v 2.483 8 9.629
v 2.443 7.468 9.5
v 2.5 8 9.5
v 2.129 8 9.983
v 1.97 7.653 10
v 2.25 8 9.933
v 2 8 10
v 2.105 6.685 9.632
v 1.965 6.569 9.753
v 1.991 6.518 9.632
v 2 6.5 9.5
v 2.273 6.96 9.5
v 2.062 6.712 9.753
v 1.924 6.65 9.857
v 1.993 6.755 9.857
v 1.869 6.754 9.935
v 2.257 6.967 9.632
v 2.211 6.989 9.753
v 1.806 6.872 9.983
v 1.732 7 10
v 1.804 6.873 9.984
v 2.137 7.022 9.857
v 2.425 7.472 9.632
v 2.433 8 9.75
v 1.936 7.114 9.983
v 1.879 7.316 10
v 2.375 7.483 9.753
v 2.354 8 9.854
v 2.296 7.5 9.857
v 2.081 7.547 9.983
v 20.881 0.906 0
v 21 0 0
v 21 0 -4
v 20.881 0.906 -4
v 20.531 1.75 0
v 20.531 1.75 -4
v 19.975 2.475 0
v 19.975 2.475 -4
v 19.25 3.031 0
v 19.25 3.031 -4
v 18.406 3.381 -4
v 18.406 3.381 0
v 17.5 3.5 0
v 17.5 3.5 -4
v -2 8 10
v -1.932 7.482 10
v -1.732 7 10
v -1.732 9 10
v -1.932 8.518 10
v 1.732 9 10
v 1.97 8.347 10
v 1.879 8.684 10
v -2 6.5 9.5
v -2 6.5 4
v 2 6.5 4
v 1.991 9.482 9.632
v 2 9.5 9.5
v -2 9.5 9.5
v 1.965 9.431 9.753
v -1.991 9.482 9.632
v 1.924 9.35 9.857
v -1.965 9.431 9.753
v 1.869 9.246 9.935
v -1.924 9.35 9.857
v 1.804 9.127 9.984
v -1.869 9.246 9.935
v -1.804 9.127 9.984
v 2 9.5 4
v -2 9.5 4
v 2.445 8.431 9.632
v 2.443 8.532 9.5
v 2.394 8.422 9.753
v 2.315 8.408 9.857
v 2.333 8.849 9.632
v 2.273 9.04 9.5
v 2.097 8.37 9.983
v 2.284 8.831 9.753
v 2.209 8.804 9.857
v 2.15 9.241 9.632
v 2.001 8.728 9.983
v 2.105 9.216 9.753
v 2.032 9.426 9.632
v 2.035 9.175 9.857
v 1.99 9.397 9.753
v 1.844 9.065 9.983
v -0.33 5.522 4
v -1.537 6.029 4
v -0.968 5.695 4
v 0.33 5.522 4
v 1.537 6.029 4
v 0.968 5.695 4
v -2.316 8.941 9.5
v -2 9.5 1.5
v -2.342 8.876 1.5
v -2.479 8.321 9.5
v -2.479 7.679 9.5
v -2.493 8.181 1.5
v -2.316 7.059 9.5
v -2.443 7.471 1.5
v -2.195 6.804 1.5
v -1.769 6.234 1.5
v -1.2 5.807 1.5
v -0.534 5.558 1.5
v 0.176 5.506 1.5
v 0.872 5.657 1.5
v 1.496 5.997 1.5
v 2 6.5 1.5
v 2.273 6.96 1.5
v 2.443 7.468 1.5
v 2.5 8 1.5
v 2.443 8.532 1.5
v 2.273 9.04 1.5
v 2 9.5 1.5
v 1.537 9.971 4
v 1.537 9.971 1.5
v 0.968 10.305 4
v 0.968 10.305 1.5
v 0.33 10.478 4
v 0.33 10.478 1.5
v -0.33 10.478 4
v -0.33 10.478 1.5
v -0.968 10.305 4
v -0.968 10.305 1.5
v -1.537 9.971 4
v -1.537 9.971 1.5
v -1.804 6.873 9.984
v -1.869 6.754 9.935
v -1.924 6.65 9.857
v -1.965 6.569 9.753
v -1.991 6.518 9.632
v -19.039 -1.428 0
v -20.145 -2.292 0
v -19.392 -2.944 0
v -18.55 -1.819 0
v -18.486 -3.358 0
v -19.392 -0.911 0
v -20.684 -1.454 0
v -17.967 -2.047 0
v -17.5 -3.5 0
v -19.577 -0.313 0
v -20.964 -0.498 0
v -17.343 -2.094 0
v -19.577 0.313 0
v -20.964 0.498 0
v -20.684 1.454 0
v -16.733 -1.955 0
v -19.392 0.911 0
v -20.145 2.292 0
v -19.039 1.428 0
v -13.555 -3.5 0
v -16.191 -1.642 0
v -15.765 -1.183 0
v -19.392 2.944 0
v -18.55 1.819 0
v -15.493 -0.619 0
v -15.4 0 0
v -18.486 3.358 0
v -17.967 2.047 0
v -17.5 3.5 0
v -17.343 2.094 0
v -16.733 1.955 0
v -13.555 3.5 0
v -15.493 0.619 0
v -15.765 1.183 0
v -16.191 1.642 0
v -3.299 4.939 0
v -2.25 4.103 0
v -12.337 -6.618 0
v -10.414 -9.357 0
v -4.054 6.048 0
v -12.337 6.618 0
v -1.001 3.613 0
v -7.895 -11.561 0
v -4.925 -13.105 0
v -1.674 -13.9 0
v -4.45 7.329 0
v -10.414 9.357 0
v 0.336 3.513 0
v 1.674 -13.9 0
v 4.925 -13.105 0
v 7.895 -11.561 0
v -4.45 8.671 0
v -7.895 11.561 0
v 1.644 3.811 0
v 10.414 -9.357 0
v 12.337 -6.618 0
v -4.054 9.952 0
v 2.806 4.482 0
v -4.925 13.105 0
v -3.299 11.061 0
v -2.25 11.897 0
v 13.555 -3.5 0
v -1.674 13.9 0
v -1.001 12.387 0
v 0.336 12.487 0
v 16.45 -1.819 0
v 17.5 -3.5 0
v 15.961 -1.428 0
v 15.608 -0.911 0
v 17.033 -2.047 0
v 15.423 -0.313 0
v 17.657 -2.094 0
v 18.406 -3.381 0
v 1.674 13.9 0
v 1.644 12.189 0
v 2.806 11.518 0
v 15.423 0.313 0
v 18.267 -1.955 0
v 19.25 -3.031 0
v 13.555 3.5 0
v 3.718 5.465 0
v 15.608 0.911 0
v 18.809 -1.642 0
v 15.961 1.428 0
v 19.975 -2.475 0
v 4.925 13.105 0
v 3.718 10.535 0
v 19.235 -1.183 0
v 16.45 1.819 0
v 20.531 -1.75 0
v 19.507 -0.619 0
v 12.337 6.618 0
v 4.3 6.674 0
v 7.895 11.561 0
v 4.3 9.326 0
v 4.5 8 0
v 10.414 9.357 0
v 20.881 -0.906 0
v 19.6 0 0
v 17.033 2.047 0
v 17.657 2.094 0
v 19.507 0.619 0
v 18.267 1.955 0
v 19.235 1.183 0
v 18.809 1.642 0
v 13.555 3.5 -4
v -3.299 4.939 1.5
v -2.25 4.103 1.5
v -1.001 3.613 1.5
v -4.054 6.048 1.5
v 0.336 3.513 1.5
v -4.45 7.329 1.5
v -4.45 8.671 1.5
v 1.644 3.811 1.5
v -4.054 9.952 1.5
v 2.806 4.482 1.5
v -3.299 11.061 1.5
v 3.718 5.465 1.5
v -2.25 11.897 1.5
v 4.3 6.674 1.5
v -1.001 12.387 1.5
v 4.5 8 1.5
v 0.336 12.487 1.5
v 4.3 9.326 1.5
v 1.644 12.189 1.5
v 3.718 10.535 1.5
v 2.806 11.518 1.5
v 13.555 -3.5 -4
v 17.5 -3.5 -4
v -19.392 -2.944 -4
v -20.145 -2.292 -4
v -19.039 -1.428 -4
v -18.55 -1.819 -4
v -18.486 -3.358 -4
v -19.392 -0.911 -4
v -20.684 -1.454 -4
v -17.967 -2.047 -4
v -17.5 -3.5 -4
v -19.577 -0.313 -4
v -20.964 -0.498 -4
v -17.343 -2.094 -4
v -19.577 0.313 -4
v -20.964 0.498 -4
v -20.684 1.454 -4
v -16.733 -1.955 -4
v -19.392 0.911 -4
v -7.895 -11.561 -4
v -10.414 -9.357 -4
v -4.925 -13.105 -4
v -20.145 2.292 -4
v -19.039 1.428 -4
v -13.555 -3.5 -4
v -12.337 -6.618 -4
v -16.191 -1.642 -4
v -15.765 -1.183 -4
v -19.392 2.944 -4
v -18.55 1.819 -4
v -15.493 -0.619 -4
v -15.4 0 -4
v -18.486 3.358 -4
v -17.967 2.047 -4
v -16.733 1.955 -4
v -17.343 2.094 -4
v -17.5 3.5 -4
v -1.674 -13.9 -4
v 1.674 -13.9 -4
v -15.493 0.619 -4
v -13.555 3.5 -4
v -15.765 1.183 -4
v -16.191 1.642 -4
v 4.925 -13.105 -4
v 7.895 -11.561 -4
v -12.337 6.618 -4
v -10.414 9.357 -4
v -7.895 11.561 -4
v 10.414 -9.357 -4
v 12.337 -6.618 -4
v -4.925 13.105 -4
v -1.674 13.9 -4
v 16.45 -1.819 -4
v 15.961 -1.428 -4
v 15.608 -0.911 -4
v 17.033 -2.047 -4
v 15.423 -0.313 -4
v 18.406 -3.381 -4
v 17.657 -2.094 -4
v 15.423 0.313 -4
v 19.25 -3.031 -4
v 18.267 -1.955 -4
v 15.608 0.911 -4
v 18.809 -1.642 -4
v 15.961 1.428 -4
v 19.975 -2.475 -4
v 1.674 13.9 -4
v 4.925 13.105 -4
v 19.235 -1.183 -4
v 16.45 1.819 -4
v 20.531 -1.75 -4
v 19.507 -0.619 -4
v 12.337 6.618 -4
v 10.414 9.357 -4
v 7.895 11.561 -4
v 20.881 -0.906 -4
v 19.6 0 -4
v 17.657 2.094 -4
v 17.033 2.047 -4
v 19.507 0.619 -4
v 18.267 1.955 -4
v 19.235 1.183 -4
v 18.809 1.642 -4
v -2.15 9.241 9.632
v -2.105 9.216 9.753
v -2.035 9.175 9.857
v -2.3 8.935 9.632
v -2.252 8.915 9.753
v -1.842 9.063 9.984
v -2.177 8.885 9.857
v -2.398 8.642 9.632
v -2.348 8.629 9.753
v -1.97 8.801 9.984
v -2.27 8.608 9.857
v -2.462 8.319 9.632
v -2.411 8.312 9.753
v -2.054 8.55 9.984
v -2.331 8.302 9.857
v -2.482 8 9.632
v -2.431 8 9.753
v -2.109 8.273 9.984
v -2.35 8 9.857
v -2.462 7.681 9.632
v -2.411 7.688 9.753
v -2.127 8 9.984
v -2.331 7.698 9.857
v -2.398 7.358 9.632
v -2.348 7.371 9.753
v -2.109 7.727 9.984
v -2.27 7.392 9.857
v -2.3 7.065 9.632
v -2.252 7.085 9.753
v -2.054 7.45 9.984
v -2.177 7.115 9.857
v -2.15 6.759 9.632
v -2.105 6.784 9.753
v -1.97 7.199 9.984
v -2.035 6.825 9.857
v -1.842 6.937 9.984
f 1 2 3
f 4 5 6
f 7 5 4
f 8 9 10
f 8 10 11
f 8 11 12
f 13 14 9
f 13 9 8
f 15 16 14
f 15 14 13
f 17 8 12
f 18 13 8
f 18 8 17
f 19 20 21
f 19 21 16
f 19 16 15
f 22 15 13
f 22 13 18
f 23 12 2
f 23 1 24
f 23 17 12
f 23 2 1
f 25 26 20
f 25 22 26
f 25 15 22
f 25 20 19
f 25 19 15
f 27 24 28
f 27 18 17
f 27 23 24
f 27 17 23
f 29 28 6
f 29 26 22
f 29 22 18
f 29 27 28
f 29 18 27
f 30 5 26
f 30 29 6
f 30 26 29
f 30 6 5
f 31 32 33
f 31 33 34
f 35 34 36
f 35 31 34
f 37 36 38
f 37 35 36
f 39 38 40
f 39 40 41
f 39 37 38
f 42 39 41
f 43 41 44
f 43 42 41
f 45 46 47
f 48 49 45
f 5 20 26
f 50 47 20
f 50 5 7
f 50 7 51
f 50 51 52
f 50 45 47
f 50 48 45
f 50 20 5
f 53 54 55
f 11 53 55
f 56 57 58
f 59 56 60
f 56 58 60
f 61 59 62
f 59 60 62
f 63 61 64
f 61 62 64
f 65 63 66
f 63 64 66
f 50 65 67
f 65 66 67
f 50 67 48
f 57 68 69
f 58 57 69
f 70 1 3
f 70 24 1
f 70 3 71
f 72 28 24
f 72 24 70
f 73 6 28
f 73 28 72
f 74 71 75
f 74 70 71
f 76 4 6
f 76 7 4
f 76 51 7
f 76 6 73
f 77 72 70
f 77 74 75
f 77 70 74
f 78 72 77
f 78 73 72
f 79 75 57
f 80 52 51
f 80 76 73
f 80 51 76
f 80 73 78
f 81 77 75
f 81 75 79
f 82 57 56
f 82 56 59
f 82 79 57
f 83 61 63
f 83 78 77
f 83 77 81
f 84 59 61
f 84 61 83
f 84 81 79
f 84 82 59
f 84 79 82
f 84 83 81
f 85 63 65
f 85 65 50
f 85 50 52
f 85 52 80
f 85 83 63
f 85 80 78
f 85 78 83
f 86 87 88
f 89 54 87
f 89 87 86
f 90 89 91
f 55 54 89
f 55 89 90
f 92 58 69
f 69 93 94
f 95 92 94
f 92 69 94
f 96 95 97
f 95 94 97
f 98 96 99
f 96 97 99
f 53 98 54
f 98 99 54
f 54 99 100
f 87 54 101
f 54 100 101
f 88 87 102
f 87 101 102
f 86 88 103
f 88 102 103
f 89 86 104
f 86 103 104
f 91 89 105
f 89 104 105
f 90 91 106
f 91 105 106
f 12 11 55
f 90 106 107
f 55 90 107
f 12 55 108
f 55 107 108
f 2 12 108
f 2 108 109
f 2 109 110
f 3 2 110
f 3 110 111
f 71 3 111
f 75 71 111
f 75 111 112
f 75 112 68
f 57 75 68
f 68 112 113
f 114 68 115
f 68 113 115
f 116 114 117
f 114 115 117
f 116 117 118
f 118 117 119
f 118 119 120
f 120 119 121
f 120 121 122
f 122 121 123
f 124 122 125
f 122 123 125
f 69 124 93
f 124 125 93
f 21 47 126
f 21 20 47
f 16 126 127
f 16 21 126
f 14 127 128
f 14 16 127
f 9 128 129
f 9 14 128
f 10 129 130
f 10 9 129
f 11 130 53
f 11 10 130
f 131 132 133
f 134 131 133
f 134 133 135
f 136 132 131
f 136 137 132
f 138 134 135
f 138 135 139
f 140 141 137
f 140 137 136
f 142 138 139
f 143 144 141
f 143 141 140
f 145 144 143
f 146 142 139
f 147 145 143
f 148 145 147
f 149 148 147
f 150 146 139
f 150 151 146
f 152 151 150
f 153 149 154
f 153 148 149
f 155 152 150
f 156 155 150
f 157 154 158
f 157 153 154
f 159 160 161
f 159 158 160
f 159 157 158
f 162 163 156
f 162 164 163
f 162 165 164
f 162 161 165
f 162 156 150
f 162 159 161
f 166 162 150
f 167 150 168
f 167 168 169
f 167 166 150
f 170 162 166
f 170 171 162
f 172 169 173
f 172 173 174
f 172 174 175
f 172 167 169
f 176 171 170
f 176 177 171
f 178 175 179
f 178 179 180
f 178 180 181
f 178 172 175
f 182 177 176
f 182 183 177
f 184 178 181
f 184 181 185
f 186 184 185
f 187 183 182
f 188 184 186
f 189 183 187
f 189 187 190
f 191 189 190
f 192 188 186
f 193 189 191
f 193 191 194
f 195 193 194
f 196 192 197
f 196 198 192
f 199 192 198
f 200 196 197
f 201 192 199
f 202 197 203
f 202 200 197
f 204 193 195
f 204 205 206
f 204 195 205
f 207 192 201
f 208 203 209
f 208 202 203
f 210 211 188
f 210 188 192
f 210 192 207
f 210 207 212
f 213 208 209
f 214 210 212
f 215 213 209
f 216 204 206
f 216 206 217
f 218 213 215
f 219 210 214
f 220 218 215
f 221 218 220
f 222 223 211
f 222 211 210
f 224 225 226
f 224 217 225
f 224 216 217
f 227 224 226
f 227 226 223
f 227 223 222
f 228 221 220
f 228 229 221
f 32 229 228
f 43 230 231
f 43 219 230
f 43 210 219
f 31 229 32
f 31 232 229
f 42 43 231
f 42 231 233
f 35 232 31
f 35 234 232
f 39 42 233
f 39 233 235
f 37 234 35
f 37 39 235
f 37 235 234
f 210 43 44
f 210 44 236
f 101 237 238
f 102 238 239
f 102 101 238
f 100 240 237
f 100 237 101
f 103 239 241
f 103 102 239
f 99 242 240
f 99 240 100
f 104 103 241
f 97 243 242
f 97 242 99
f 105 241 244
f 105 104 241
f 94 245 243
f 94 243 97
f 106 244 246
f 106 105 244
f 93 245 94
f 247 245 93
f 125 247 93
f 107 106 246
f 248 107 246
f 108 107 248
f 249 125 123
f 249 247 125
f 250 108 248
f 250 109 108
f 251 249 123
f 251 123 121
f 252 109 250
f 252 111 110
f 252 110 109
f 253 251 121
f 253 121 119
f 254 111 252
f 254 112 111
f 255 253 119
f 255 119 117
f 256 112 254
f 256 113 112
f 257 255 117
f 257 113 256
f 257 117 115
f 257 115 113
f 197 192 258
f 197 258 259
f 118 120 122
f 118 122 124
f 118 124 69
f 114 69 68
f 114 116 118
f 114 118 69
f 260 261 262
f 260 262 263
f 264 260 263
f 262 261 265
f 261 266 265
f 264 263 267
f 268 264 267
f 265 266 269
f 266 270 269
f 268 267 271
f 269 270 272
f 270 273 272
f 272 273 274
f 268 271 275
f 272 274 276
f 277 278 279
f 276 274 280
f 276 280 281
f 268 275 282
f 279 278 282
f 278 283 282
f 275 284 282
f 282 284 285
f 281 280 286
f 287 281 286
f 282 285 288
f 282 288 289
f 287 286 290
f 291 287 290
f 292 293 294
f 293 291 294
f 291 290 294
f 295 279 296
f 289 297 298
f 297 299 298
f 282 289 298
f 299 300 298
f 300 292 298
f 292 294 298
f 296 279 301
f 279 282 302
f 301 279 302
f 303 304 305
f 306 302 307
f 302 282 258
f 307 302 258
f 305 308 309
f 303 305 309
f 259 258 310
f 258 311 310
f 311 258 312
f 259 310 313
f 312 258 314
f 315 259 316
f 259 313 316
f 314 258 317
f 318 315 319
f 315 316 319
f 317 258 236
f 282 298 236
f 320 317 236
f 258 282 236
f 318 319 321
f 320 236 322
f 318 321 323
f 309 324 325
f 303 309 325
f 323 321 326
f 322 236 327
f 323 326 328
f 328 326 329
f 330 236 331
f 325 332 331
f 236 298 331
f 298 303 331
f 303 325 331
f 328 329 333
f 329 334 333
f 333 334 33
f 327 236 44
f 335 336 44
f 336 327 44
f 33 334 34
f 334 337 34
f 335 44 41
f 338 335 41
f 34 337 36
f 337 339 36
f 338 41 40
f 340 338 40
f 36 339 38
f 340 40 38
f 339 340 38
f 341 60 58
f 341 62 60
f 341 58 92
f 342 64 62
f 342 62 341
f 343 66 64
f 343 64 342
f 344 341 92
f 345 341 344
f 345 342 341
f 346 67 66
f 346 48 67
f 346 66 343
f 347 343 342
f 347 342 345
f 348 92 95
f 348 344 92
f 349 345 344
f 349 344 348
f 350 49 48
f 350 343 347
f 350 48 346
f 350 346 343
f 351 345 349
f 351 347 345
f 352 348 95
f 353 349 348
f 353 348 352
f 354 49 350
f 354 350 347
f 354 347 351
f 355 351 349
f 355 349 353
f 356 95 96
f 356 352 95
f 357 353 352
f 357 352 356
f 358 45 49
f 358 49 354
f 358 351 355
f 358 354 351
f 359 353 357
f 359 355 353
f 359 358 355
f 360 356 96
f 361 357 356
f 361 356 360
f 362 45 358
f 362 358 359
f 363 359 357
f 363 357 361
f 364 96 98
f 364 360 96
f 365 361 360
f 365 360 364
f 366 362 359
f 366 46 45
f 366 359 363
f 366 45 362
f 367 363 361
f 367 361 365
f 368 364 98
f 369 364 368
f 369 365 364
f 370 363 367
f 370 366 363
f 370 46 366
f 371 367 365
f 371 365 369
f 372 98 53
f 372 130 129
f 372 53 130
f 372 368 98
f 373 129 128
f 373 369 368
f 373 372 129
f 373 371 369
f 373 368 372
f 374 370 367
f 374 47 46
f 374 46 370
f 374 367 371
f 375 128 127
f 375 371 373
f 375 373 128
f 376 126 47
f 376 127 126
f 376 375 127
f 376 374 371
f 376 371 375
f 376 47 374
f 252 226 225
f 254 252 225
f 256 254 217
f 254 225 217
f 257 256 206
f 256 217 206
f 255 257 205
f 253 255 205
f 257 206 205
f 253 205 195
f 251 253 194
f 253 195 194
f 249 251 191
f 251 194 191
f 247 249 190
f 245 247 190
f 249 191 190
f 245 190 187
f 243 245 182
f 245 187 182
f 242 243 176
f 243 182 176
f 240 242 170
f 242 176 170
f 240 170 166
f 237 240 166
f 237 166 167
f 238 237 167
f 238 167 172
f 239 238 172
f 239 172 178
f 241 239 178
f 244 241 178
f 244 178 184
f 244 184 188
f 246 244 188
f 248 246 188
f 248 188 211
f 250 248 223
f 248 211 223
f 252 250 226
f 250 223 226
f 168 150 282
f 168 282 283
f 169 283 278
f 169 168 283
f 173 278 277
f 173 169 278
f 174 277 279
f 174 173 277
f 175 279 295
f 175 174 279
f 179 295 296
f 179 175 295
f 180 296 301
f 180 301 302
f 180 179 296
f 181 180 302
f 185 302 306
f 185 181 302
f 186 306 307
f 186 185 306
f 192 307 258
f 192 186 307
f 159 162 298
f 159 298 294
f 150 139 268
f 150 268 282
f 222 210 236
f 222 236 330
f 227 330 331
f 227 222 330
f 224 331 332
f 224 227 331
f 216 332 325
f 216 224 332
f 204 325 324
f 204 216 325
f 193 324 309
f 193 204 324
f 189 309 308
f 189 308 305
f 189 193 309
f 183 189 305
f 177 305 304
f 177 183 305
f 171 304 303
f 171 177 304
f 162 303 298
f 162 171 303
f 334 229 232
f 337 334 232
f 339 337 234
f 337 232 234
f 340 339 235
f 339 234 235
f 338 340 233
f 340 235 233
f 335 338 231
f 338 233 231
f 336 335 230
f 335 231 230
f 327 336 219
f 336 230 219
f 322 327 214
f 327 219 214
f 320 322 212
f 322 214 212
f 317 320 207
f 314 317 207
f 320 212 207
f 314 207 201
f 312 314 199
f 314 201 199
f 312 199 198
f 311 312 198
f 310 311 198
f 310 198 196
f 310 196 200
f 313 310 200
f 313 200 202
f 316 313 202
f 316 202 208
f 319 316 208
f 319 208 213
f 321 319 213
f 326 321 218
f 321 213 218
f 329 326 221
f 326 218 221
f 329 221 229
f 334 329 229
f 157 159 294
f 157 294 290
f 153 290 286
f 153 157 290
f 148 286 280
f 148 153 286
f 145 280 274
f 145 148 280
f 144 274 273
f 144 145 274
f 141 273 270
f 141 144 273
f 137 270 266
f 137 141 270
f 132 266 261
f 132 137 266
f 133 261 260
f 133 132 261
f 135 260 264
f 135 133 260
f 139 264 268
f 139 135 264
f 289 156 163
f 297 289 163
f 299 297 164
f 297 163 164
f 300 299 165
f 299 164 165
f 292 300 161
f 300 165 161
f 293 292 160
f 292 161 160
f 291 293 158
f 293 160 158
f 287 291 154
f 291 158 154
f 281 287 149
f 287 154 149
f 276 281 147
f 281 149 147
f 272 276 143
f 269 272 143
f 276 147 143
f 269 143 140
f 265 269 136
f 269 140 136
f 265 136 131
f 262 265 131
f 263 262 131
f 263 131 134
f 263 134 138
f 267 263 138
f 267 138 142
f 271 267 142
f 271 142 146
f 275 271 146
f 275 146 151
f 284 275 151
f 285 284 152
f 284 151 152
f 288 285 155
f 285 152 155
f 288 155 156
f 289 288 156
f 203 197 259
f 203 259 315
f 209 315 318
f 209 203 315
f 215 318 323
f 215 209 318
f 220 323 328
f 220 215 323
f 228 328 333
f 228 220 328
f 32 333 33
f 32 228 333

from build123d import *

# Parameters (mm, degrees)
F1_DEPTH = 10
F2_DEPTH = 4
F0_R     = 4.5
F3_DEPTH = 1.5
F4_R     = 0.5
F0_R_2   = 2.1
F5_DEPTH = 4


with BuildPart() as f1:
    # F0 (on Top) → F1 (new body)
    with BuildSketch(Plane.XY):
        with BuildLine():
            ThreePointArc((2, 6.5), (2.3717082451, 7.209430585), (2.5, 8))
            ThreePointArc((2.5, 8), (2.3717082451, 8.790569415), (2, 9.5))
            Line((2, 9.5), (-2, 9.5))
            ThreePointArc((-2, 9.5), (-2.5, 8), (-2, 6.5))
            Line((-2, 6.5), (2, 6.5))
        make_face()
    extrude(amount=F1_DEPTH)

    # F0 (on Top) → F2 (join)
    with BuildSketch(Plane.XY):
        with BuildLine():
            ThreePointArc((-2, 6.5), (0, 5.5), (2, 6.5))
            Line((2, 6.5), (-2, 6.5))
        make_face()
        with BuildLine():
            Line((-2, 9.5), (2, 9.5))
            ThreePointArc((2, 9.5), (0, 10.5), (-2, 9.5))
        make_face()
    extrude(amount=F2_DEPTH)

    # F0 (on Top) → F3 (join)
    with BuildSketch(Plane.XY):
        with Locations((0, 8)):
            Circle(F0_R)
        with BuildLine():
            ThreePointArc((2, 9.5), (2.3717082451, 8.790569415), (2.5, 8))
            ThreePointArc((2.5, 8), (2.3717082451, 7.209430585), (2, 6.5))
            ThreePointArc((2, 6.5), (0, 5.5), (-2, 6.5))
            ThreePointArc((-2, 6.5), (-2.5, 8), (-2, 9.5))
            ThreePointArc((-2, 9.5), (0, 10.5), (2, 9.5))
        make_face(mode=Mode.SUBTRACT)
    extrude(amount=F3_DEPTH)

    # F4
    f4_edges = [f1.edges().sort_by_distance(p)[0] for p in [
        (0, 9.5, 10),
        (0, 6.5, 10),
        (2.5, 8, 10),
        (-2.5, 8, 10),
    ]]
    fillet(f4_edges, radius=F4_R)

    # F0 (on Top) → F5 (join)
    with BuildSketch(Plane.XY):
        with BuildLine():
            ThreePointArc((13.5554417117, -3.5), (13.8884157477, -1.7640600948), (14, 0))
            ThreePointArc((14, 0), (13.8884157477, 1.7640600948), (13.5554417117, 3.5))
            ThreePointArc((13.5554417117, 3.5), (0, 14), (-13.5554417117, 3.5))
            ThreePointArc((-13.5554417117, 3.5), (-13.8884157477, 1.7640600948), (-14, 0))
            ThreePointArc((-14, 0), (-13.8884157477, -1.7640600948), (-13.5554417117, -3.5))
            ThreePointArc((-13.5554417117, -3.5), (0, -14), (13.5554417117, -3.5))
        make_face()
        with Locations((0, 8)):
            Circle(F0_R, mode=Mode.SUBTRACT)
        with BuildLine():
            ThreePointArc((-17.5, -3.5), (-15.0251262658, -2.4748737342), (-14, 0))
            ThreePointArc((-14, 0), (-15.0251262658, 2.4748737342), (-17.5, 3.5))
            ThreePointArc((-17.5, 3.5), (-21, 0), (-17.5, -3.5))
        make_face()
        with Locations((-17.5, 0)):
            Circle(F0_R_2, mode=Mode.SUBTRACT)
        with BuildLine():
            ThreePointArc((-14, 0), (-13.8884157477, 1.7640600948), (-13.5554417117, 3.5))
            Line((-13.5554417117, 3.5), (-17.5, 3.5))
            ThreePointArc((-17.5, 3.5), (-15.0251262658, 2.4748737342), (-14, 0))
        make_face()
        with BuildLine():
            Line((-17.5, -3.5), (-13.5554417117, -3.5))
            ThreePointArc((-13.5554417117, -3.5), (-13.8884157477, -1.7640600948), (-14, 0))
            ThreePointArc((-14, 0), (-15.0251262658, -2.4748737342), (-17.5, -3.5))
        make_face()
        with BuildLine():
            ThreePointArc((17.5, 3.5), (15.0251262658, 2.4748737342), (14, 0))
            ThreePointArc((14, 0), (15.0251262658, -2.4748737342), (17.5, -3.5))
            ThreePointArc((17.5, -3.5), (19.9748737342, -2.4748737342), (21, 0))
            ThreePointArc((21, 0), (19.9748737342, 2.4748737342), (17.5, 3.5))
        make_face()
        with Locations((17.5, 0)):
            Circle(F0_R_2, mode=Mode.SUBTRACT)
        with BuildLine():
            ThreePointArc((13.5554417117, 3.5), (13.8884157477, 1.7640600948), (14, 0))
            ThreePointArc((14, 0), (15.0251262658, 2.4748737342), (17.5, 3.5))
            Line((17.5, 3.5), (13.5554417117, 3.5))
        make_face()
        with BuildLine():
            ThreePointArc((17.5, -3.5), (15.0251262658, -2.4748737342), (14, 0))
            ThreePointArc((14, 0), (13.8884157477, -1.7640600948), (13.5554417117, -3.5))
            Line((13.5554417117, -3.5), (17.5, -3.5))
        make_face()
        with Locations((0, 8)):
            Circle(F0_R)
        with BuildLine():
            ThreePointArc((2, 9.5), (2.3717082451, 8.790569415), (2.5, 8))
            ThreePointArc((2.5, 8), (2.3717082451, 7.209430585), (2, 6.5))
            ThreePointArc((2, 6.5), (0, 5.5), (-2, 6.5))
            ThreePointArc((-2, 6.5), (-2.5, 8), (-2, 9.5))
            ThreePointArc((-2, 9.5), (0, 10.5), (2, 9.5))
        make_face(mode=Mode.SUBTRACT)
        with BuildLine():
            ThreePointArc((2, 6.5), (2.3717082451, 7.209430585), (2.5, 8))
            ThreePointArc((2.5, 8), (2.3717082451, 8.790569415), (2, 9.5))
            Line((2, 9.5), (-2, 9.5))
            ThreePointArc((-2, 9.5), (-2.5, 8), (-2, 6.5))
            Line((-2, 6.5), (2, 6.5))
        make_face()
        with BuildLine():
            ThreePointArc((-2, 6.5), (0, 5.5), (2, 6.5))
            Line((2, 6.5), (-2, 6.5))
        make_face()
        with BuildLine():
            Line((-2, 9.5), (2, 9.5))
            ThreePointArc((2, 9.5), (0, 10.5), (-2, 9.5))
        make_face()
    extrude(amount=-F5_DEPTH)


solid = f1.part
